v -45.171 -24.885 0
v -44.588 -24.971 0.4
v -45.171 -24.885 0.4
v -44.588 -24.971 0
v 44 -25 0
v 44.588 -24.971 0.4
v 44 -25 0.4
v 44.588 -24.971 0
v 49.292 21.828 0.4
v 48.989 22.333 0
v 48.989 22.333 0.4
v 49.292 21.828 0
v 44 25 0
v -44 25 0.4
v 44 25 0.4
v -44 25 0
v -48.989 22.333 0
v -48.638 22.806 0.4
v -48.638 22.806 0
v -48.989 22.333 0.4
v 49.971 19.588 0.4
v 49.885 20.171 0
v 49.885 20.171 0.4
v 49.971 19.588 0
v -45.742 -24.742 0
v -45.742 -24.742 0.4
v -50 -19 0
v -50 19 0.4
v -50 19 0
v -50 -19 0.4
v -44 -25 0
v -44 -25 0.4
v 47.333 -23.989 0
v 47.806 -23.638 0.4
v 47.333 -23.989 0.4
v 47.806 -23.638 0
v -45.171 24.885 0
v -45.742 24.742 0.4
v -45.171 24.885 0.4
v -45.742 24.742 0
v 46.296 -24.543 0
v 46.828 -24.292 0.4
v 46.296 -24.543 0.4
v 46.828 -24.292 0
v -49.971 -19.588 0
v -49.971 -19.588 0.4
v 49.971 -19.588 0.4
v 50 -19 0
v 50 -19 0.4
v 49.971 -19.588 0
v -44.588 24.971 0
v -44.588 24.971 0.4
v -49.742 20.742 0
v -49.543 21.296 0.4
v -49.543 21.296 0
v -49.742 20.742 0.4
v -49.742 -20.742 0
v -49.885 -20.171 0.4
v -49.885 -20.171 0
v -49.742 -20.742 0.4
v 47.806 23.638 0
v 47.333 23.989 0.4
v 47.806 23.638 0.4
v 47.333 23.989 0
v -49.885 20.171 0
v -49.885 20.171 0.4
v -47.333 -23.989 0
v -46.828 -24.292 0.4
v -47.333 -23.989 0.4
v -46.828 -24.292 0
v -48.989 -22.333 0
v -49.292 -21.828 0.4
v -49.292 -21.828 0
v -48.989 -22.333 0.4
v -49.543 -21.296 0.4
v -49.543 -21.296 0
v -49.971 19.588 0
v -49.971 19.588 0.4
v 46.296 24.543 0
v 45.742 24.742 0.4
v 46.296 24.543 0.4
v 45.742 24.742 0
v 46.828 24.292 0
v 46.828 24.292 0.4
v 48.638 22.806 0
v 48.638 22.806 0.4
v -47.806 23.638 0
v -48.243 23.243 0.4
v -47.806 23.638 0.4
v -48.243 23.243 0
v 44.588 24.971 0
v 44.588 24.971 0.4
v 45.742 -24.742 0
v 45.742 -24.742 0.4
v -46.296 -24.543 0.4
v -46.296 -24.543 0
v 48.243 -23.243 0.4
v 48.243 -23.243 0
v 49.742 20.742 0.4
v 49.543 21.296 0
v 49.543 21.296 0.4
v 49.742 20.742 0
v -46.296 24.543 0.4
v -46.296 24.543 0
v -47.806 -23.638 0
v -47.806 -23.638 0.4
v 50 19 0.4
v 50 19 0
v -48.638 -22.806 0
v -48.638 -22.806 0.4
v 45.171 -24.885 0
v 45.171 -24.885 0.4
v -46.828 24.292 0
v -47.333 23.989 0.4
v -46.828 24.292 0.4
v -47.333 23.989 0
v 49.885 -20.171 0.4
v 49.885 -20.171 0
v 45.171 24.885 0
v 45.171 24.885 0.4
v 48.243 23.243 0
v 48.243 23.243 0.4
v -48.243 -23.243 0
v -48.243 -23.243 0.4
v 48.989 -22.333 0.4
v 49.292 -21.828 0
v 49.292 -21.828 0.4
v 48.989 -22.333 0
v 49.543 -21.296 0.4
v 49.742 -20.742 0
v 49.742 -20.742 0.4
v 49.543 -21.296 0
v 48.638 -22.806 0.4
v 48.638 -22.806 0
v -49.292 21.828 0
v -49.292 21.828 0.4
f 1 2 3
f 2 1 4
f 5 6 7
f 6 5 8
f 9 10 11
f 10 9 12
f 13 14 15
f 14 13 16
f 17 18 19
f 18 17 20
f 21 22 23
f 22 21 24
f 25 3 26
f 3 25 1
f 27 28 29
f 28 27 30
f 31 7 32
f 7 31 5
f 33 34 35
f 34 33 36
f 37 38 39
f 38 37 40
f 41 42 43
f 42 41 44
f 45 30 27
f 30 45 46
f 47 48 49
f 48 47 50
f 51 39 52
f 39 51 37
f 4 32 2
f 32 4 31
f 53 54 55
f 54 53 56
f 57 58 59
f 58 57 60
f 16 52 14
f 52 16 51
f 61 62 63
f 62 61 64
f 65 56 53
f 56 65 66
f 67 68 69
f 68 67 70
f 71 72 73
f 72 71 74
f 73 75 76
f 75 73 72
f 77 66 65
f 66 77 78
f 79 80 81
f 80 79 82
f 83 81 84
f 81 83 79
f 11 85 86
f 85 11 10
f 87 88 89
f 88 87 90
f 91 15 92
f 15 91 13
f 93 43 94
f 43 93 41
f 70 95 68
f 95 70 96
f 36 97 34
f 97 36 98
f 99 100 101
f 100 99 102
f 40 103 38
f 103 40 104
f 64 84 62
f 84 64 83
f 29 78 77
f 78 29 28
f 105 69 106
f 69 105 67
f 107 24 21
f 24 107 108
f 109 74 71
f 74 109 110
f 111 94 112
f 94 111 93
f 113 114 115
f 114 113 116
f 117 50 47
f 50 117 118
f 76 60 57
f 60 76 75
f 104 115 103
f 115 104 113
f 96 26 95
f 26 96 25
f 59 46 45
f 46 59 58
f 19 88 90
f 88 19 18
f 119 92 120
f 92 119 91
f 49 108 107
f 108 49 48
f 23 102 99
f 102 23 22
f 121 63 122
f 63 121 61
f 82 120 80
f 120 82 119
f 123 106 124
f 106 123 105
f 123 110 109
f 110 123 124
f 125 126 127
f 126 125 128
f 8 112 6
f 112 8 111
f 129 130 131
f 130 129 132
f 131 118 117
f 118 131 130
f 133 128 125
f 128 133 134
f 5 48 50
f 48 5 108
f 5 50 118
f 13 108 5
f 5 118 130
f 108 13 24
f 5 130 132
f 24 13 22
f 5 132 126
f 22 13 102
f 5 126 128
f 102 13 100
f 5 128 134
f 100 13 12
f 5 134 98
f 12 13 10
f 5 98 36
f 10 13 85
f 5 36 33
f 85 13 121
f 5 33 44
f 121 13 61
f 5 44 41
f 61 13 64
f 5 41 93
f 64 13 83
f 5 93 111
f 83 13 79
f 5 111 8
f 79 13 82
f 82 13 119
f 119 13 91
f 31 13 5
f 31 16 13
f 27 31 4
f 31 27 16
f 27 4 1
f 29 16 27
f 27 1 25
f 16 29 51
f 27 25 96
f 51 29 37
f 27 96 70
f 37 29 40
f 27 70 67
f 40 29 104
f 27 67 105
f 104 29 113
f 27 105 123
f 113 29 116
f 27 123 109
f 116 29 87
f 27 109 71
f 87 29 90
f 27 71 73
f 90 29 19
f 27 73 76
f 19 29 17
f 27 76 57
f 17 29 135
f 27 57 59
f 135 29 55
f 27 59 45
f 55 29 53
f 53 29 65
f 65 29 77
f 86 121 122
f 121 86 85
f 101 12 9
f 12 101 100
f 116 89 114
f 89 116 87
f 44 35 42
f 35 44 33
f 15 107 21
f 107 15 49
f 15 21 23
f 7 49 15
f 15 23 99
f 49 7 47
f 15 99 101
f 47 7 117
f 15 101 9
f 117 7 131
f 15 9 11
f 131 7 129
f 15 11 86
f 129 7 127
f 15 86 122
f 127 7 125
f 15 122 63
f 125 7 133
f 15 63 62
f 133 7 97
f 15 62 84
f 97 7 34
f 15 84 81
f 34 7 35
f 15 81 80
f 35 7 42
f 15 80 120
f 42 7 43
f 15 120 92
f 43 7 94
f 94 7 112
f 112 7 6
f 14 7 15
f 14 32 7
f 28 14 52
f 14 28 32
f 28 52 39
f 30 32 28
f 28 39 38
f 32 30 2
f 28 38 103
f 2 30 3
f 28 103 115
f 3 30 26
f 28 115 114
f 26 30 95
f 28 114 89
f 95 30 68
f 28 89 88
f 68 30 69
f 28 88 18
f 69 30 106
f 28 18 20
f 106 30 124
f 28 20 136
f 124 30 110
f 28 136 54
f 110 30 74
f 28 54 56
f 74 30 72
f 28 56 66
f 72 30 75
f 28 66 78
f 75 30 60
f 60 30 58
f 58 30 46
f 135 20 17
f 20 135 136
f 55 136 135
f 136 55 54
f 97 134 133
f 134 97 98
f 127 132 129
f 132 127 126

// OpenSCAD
// =====================================================
//  Klett-Patch  –  2 Farben, 2 Layer PETG
//  part = "basis"  -> Platte mit ausgestanzter Schrift
//  part = "text"   -> nur die Schrift (passt exakt rein)
//  part = "beide"  -> Vorschau
// =====================================================

part = "beide";             // "basis" | "text" | "beide"

// ---- Form & Größe (mm) ----
form    = "rechteck";       // "rechteck" | "oval"
breite  = 100;
hoehe   = 50;
radius  = 6;                // Eckenradius (nur Rechteck)

// ---- Schichten ----
layer_hoehe = 0.2;          // = Layerhöhe im Slicer!
layers      = 2;
dicke       = layer_hoehe * layers;

// true  = Schrift geht durch beide Layer (beidseitig sichtbar)
// false = unterster Layer bleibt durchgehend Basisfarbe,
//         Schrift nur im oberen Layer (stabiler, empfohlen)
text_durch = false;

// ---- Text ----
zeilen        = ["MEIN", "PATCH"];  // eine oder mehrere Zeilen
schrift       = "Liberation Sans:style=Bold";
text_groesse  = 12;         // Buchstabenhöhe pro Zeile
zeilenabstand = 1.3;        // Faktor
rand          = 6;          // freier Rand zum Umnähen
an_breite_anpassen = false; // true = Text auf volle Breite strecken (Höhe prüfen!)

// ---------------------------------------------------
$fn = 64;
eps = 0.01;

module umriss() {
    if (form == "oval")
        scale([breite/2, hoehe/2]) circle(r = 1, $fn = 128);
    else
        offset(r = radius) offset(delta = -radius)
            square([breite, hoehe], center = true);
}

module text_roh() {
    n = len(zeilen);
    for (i = [0 : n-1])
        translate([0, ((n-1)/2 - i) * text_groesse * zeilenabstand])
            text(zeilen[i], size = text_groesse, font = schrift,
                 halign = "center", valign = "center");
}

module text_2d() {
    // beim Oval ist die nutzbare Breite etwas kleiner
    max_b = (form == "oval" ? breite * 0.75 : breite) - 2*rand;
    max_h = (form == "oval" ? hoehe  * 0.75 : hoehe ) - 2*rand;
    if (an_breite_anpassen)
        resize([max_b, 0], auto = [true, true]) text_roh();
    else
        text_roh();
    // Hinweis: Wird der Text zu hoch, text_groesse/zeilen anpassen.
    echo(str("Max. Textfläche: ", max_b, " x ", max_h, " mm"));
}

// Höhe des Textbereichs
text_z0 = text_durch ? 0 : layer_hoehe;
text_h  = dicke - text_z0;

module basis() {
    difference() {
        linear_extrude(dicke) umriss();
        translate([0, 0, text_z0 - (text_durch ? eps : 0)])
            linear_extrude(text_h + 2*eps) text_2d();
    }
}

module schrift_teil() {
    translate([0, 0, text_z0])
        linear_extrude(text_h) text_2d();
}

if (part == "basis")  basis();
if (part == "text")   schrift_teil();
if (part == "beide") {
    color("navy")  basis();
    color("gold")  schrift_teil();
}
